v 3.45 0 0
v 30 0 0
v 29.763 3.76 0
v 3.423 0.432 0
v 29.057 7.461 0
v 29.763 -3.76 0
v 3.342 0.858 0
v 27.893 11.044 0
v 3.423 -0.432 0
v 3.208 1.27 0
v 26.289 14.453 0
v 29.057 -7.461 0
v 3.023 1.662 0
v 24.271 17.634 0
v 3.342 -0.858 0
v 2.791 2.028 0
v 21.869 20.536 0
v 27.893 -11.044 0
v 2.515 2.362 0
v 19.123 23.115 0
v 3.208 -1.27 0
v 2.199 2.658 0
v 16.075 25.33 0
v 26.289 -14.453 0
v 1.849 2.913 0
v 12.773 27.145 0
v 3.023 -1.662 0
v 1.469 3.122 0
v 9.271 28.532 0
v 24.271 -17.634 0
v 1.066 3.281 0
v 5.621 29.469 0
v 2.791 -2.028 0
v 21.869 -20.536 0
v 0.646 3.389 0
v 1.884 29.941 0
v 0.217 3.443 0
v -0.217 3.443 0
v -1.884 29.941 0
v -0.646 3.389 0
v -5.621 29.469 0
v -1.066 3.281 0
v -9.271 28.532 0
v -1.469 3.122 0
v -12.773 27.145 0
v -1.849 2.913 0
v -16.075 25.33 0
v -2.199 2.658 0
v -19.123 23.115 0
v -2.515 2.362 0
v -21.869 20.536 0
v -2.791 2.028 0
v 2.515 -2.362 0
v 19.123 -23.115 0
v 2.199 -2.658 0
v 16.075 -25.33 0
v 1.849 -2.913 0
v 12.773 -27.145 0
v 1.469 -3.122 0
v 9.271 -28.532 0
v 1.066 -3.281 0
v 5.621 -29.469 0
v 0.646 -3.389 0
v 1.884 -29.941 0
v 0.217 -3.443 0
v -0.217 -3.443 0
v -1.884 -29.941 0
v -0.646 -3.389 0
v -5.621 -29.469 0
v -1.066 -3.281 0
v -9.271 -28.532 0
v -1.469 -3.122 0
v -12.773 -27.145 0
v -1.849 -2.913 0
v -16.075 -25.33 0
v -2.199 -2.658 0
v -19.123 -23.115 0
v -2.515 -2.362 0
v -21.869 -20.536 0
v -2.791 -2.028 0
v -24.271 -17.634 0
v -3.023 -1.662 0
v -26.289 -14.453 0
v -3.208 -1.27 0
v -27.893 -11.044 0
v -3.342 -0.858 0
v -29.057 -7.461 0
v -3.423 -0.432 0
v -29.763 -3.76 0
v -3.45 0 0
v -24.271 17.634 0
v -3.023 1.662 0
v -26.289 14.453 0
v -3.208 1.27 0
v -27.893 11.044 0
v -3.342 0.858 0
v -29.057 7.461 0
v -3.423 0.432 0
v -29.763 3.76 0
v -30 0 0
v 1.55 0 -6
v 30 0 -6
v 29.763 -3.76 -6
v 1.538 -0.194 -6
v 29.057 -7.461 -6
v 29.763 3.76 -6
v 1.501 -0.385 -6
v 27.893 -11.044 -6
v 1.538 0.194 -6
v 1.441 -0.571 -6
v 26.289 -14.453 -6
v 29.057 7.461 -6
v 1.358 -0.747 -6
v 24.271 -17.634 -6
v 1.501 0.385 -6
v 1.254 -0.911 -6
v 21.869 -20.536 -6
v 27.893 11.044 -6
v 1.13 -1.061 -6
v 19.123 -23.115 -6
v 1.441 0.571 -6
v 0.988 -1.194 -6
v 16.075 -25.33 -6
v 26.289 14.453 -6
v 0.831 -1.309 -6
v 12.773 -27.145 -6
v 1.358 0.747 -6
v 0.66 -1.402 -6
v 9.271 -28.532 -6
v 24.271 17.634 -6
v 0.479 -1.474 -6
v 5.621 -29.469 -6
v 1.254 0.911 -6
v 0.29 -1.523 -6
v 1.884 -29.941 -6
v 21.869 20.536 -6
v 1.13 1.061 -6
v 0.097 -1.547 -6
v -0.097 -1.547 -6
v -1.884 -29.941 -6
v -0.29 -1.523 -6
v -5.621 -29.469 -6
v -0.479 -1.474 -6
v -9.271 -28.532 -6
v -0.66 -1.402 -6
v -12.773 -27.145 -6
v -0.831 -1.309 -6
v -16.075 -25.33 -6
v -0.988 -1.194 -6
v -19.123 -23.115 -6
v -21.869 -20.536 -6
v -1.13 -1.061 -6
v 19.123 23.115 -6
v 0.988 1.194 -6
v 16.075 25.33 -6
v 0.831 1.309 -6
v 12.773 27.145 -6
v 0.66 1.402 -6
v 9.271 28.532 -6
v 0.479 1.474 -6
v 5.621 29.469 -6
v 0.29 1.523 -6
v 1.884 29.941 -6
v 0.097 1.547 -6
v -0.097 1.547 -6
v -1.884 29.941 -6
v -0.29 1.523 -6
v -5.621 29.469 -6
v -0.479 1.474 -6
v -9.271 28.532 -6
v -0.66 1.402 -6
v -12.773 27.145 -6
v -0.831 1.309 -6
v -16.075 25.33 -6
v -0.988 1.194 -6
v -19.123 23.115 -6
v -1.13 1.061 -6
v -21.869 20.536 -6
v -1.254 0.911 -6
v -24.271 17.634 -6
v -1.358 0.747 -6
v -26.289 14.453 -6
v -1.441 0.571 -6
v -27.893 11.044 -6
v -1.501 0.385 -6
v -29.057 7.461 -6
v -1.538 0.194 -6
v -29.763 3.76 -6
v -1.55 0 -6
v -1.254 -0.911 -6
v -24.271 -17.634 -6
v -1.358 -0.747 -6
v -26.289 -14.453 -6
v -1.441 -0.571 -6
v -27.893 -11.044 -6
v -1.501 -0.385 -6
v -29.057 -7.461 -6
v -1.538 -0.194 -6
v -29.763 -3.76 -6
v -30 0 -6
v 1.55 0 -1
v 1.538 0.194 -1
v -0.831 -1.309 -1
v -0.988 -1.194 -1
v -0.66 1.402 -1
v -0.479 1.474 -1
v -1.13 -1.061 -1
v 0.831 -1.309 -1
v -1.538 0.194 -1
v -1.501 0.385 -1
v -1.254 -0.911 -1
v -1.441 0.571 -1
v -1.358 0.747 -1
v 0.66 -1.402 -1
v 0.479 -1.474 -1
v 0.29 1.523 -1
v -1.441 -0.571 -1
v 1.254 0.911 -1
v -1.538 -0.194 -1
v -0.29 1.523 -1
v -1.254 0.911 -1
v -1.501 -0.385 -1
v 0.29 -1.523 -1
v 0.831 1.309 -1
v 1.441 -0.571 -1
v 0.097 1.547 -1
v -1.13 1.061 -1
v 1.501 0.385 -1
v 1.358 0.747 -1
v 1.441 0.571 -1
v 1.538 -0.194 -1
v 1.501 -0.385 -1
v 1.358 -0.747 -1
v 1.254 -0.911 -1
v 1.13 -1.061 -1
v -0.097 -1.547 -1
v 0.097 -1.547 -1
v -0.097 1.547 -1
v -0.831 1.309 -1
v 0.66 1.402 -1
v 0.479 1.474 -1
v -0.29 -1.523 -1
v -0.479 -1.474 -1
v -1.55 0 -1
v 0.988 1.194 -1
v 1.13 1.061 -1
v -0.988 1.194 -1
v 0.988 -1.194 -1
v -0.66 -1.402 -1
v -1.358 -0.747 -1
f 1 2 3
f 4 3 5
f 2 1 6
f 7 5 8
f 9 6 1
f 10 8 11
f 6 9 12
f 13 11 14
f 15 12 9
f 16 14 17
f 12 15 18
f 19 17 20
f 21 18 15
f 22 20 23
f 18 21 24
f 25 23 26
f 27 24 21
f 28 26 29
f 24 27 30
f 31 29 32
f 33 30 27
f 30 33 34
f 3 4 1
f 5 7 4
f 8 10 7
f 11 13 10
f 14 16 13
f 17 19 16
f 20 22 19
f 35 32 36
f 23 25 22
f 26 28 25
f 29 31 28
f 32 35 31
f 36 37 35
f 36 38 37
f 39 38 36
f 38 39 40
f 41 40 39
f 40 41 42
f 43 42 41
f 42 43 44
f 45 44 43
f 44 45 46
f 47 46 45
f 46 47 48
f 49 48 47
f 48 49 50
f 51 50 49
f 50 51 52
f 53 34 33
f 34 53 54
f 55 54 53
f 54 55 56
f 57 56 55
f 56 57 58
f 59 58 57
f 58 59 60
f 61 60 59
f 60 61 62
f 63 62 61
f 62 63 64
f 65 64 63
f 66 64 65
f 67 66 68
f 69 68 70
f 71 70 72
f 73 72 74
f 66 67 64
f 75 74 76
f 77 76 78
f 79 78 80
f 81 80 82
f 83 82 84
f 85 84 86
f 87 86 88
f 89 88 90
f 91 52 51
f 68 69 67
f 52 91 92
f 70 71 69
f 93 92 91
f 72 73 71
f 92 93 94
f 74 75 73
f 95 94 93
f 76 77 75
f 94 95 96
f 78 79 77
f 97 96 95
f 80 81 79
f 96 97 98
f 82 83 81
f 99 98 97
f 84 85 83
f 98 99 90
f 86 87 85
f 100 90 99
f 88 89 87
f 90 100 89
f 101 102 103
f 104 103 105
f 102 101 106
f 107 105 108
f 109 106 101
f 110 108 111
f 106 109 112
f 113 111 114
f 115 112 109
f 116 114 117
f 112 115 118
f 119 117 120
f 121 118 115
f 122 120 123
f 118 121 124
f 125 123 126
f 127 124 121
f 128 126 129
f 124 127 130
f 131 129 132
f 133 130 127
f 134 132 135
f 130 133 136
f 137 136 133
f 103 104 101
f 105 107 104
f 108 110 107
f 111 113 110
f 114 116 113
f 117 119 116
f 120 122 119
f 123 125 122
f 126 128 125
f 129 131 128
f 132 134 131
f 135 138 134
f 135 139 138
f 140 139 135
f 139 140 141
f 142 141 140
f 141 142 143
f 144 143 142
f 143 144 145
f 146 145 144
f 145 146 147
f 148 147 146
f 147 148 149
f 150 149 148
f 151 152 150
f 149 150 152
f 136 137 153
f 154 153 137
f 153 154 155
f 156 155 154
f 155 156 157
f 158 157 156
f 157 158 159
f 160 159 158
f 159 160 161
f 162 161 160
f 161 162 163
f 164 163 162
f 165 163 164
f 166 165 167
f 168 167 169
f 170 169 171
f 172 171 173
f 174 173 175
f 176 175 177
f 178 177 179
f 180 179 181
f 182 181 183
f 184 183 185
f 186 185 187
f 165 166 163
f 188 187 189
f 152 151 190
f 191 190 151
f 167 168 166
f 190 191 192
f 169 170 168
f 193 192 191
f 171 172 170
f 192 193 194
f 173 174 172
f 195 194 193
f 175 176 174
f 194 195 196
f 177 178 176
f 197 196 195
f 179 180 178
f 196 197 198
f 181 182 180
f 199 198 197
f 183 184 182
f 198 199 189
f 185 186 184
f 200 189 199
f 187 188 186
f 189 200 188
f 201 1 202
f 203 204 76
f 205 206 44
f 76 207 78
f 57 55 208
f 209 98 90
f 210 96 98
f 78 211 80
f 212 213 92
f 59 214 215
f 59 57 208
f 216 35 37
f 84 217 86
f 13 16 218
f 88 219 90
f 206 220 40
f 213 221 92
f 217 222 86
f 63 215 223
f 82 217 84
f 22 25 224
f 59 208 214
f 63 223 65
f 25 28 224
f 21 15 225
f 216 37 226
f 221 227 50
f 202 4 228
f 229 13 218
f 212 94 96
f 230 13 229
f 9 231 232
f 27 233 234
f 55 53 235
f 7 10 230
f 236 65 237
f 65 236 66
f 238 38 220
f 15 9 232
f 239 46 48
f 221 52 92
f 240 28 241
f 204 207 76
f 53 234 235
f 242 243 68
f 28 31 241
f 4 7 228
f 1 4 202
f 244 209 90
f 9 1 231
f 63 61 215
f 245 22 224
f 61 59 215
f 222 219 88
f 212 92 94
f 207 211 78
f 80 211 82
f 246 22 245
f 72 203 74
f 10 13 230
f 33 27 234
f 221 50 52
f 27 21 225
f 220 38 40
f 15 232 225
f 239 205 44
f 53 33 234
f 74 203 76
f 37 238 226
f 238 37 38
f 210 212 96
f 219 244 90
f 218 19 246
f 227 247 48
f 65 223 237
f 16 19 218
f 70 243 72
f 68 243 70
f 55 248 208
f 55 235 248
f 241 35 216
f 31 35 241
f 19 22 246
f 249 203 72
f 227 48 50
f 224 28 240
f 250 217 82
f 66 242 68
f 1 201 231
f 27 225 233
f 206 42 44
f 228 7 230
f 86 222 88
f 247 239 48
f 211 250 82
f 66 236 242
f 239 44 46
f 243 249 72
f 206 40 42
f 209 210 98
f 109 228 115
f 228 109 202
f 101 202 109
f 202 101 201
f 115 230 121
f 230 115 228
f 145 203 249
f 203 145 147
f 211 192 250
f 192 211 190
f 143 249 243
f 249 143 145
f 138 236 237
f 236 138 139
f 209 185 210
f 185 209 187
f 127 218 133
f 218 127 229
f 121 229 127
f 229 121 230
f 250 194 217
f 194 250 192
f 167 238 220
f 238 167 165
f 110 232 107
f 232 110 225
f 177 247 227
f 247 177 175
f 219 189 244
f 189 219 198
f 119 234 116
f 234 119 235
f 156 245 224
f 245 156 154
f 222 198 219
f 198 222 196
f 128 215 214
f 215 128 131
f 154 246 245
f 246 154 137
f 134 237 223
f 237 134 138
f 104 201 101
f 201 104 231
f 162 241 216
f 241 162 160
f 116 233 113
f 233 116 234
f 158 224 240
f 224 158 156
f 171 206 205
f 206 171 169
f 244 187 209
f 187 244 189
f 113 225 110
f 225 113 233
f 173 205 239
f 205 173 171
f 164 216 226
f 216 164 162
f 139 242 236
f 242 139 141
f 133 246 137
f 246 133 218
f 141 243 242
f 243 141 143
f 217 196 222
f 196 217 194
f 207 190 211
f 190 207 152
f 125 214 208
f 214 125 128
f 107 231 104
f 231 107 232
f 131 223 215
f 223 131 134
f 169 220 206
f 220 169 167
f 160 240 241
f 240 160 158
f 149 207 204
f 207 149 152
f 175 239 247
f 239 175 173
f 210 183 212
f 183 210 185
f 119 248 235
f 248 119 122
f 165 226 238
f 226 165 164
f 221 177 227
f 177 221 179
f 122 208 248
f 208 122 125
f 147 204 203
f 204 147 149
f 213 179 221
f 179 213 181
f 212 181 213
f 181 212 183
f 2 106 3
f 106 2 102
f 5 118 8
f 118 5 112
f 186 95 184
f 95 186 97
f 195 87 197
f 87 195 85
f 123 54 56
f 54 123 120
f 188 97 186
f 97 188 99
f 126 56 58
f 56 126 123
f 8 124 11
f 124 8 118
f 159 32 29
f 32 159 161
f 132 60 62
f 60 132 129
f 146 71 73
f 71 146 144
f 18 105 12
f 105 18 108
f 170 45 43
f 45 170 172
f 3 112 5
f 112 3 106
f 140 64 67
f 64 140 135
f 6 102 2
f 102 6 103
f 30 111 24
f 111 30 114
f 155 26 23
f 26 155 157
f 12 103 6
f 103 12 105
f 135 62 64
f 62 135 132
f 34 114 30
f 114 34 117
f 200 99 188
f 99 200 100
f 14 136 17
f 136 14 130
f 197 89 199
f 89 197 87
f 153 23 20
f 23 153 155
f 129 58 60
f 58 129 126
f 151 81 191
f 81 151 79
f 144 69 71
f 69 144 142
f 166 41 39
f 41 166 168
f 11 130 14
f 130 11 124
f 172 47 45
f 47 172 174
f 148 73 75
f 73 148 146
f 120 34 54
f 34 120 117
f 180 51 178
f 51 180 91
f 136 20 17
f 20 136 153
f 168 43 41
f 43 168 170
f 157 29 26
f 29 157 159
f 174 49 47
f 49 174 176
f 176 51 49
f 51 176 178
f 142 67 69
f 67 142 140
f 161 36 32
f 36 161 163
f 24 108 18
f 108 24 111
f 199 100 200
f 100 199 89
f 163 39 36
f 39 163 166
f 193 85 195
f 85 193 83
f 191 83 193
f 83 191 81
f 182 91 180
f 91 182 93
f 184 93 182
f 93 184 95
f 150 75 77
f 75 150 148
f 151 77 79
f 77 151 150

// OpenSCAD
$fn = 50;


difference() {
	union() {
		translate(v = [0, 0, -6.0000000000]) {
			cylinder(h = 6, r = 30.0000000000);
		}
	}
	union() {
		translate(v = [0, 0, 0]) {
			rotate(a = [0, 0, 0]) {
				difference() {
					union() {
						translate(v = [0, 0, -6.0000000000]) {
							cylinder(h = 6, r = 1.2500000000);
						}
						translate(v = [0, 0, -1.0000000000]) {
							cylinder(h = 1.0000000000, r1 = 1.5500000000, r2 = 3.4500000000);
						}
						translate(v = [0, 0, -6.0000000000]) {
							cylinder(h = 6, r = 1.5500000000);
						}
						translate(v = [0, 0, -6.0000000000]) {
							cylinder(h = 6, r = 1.2500000000);
						}
					}
					union();
				}
			}
		}
	}
}
